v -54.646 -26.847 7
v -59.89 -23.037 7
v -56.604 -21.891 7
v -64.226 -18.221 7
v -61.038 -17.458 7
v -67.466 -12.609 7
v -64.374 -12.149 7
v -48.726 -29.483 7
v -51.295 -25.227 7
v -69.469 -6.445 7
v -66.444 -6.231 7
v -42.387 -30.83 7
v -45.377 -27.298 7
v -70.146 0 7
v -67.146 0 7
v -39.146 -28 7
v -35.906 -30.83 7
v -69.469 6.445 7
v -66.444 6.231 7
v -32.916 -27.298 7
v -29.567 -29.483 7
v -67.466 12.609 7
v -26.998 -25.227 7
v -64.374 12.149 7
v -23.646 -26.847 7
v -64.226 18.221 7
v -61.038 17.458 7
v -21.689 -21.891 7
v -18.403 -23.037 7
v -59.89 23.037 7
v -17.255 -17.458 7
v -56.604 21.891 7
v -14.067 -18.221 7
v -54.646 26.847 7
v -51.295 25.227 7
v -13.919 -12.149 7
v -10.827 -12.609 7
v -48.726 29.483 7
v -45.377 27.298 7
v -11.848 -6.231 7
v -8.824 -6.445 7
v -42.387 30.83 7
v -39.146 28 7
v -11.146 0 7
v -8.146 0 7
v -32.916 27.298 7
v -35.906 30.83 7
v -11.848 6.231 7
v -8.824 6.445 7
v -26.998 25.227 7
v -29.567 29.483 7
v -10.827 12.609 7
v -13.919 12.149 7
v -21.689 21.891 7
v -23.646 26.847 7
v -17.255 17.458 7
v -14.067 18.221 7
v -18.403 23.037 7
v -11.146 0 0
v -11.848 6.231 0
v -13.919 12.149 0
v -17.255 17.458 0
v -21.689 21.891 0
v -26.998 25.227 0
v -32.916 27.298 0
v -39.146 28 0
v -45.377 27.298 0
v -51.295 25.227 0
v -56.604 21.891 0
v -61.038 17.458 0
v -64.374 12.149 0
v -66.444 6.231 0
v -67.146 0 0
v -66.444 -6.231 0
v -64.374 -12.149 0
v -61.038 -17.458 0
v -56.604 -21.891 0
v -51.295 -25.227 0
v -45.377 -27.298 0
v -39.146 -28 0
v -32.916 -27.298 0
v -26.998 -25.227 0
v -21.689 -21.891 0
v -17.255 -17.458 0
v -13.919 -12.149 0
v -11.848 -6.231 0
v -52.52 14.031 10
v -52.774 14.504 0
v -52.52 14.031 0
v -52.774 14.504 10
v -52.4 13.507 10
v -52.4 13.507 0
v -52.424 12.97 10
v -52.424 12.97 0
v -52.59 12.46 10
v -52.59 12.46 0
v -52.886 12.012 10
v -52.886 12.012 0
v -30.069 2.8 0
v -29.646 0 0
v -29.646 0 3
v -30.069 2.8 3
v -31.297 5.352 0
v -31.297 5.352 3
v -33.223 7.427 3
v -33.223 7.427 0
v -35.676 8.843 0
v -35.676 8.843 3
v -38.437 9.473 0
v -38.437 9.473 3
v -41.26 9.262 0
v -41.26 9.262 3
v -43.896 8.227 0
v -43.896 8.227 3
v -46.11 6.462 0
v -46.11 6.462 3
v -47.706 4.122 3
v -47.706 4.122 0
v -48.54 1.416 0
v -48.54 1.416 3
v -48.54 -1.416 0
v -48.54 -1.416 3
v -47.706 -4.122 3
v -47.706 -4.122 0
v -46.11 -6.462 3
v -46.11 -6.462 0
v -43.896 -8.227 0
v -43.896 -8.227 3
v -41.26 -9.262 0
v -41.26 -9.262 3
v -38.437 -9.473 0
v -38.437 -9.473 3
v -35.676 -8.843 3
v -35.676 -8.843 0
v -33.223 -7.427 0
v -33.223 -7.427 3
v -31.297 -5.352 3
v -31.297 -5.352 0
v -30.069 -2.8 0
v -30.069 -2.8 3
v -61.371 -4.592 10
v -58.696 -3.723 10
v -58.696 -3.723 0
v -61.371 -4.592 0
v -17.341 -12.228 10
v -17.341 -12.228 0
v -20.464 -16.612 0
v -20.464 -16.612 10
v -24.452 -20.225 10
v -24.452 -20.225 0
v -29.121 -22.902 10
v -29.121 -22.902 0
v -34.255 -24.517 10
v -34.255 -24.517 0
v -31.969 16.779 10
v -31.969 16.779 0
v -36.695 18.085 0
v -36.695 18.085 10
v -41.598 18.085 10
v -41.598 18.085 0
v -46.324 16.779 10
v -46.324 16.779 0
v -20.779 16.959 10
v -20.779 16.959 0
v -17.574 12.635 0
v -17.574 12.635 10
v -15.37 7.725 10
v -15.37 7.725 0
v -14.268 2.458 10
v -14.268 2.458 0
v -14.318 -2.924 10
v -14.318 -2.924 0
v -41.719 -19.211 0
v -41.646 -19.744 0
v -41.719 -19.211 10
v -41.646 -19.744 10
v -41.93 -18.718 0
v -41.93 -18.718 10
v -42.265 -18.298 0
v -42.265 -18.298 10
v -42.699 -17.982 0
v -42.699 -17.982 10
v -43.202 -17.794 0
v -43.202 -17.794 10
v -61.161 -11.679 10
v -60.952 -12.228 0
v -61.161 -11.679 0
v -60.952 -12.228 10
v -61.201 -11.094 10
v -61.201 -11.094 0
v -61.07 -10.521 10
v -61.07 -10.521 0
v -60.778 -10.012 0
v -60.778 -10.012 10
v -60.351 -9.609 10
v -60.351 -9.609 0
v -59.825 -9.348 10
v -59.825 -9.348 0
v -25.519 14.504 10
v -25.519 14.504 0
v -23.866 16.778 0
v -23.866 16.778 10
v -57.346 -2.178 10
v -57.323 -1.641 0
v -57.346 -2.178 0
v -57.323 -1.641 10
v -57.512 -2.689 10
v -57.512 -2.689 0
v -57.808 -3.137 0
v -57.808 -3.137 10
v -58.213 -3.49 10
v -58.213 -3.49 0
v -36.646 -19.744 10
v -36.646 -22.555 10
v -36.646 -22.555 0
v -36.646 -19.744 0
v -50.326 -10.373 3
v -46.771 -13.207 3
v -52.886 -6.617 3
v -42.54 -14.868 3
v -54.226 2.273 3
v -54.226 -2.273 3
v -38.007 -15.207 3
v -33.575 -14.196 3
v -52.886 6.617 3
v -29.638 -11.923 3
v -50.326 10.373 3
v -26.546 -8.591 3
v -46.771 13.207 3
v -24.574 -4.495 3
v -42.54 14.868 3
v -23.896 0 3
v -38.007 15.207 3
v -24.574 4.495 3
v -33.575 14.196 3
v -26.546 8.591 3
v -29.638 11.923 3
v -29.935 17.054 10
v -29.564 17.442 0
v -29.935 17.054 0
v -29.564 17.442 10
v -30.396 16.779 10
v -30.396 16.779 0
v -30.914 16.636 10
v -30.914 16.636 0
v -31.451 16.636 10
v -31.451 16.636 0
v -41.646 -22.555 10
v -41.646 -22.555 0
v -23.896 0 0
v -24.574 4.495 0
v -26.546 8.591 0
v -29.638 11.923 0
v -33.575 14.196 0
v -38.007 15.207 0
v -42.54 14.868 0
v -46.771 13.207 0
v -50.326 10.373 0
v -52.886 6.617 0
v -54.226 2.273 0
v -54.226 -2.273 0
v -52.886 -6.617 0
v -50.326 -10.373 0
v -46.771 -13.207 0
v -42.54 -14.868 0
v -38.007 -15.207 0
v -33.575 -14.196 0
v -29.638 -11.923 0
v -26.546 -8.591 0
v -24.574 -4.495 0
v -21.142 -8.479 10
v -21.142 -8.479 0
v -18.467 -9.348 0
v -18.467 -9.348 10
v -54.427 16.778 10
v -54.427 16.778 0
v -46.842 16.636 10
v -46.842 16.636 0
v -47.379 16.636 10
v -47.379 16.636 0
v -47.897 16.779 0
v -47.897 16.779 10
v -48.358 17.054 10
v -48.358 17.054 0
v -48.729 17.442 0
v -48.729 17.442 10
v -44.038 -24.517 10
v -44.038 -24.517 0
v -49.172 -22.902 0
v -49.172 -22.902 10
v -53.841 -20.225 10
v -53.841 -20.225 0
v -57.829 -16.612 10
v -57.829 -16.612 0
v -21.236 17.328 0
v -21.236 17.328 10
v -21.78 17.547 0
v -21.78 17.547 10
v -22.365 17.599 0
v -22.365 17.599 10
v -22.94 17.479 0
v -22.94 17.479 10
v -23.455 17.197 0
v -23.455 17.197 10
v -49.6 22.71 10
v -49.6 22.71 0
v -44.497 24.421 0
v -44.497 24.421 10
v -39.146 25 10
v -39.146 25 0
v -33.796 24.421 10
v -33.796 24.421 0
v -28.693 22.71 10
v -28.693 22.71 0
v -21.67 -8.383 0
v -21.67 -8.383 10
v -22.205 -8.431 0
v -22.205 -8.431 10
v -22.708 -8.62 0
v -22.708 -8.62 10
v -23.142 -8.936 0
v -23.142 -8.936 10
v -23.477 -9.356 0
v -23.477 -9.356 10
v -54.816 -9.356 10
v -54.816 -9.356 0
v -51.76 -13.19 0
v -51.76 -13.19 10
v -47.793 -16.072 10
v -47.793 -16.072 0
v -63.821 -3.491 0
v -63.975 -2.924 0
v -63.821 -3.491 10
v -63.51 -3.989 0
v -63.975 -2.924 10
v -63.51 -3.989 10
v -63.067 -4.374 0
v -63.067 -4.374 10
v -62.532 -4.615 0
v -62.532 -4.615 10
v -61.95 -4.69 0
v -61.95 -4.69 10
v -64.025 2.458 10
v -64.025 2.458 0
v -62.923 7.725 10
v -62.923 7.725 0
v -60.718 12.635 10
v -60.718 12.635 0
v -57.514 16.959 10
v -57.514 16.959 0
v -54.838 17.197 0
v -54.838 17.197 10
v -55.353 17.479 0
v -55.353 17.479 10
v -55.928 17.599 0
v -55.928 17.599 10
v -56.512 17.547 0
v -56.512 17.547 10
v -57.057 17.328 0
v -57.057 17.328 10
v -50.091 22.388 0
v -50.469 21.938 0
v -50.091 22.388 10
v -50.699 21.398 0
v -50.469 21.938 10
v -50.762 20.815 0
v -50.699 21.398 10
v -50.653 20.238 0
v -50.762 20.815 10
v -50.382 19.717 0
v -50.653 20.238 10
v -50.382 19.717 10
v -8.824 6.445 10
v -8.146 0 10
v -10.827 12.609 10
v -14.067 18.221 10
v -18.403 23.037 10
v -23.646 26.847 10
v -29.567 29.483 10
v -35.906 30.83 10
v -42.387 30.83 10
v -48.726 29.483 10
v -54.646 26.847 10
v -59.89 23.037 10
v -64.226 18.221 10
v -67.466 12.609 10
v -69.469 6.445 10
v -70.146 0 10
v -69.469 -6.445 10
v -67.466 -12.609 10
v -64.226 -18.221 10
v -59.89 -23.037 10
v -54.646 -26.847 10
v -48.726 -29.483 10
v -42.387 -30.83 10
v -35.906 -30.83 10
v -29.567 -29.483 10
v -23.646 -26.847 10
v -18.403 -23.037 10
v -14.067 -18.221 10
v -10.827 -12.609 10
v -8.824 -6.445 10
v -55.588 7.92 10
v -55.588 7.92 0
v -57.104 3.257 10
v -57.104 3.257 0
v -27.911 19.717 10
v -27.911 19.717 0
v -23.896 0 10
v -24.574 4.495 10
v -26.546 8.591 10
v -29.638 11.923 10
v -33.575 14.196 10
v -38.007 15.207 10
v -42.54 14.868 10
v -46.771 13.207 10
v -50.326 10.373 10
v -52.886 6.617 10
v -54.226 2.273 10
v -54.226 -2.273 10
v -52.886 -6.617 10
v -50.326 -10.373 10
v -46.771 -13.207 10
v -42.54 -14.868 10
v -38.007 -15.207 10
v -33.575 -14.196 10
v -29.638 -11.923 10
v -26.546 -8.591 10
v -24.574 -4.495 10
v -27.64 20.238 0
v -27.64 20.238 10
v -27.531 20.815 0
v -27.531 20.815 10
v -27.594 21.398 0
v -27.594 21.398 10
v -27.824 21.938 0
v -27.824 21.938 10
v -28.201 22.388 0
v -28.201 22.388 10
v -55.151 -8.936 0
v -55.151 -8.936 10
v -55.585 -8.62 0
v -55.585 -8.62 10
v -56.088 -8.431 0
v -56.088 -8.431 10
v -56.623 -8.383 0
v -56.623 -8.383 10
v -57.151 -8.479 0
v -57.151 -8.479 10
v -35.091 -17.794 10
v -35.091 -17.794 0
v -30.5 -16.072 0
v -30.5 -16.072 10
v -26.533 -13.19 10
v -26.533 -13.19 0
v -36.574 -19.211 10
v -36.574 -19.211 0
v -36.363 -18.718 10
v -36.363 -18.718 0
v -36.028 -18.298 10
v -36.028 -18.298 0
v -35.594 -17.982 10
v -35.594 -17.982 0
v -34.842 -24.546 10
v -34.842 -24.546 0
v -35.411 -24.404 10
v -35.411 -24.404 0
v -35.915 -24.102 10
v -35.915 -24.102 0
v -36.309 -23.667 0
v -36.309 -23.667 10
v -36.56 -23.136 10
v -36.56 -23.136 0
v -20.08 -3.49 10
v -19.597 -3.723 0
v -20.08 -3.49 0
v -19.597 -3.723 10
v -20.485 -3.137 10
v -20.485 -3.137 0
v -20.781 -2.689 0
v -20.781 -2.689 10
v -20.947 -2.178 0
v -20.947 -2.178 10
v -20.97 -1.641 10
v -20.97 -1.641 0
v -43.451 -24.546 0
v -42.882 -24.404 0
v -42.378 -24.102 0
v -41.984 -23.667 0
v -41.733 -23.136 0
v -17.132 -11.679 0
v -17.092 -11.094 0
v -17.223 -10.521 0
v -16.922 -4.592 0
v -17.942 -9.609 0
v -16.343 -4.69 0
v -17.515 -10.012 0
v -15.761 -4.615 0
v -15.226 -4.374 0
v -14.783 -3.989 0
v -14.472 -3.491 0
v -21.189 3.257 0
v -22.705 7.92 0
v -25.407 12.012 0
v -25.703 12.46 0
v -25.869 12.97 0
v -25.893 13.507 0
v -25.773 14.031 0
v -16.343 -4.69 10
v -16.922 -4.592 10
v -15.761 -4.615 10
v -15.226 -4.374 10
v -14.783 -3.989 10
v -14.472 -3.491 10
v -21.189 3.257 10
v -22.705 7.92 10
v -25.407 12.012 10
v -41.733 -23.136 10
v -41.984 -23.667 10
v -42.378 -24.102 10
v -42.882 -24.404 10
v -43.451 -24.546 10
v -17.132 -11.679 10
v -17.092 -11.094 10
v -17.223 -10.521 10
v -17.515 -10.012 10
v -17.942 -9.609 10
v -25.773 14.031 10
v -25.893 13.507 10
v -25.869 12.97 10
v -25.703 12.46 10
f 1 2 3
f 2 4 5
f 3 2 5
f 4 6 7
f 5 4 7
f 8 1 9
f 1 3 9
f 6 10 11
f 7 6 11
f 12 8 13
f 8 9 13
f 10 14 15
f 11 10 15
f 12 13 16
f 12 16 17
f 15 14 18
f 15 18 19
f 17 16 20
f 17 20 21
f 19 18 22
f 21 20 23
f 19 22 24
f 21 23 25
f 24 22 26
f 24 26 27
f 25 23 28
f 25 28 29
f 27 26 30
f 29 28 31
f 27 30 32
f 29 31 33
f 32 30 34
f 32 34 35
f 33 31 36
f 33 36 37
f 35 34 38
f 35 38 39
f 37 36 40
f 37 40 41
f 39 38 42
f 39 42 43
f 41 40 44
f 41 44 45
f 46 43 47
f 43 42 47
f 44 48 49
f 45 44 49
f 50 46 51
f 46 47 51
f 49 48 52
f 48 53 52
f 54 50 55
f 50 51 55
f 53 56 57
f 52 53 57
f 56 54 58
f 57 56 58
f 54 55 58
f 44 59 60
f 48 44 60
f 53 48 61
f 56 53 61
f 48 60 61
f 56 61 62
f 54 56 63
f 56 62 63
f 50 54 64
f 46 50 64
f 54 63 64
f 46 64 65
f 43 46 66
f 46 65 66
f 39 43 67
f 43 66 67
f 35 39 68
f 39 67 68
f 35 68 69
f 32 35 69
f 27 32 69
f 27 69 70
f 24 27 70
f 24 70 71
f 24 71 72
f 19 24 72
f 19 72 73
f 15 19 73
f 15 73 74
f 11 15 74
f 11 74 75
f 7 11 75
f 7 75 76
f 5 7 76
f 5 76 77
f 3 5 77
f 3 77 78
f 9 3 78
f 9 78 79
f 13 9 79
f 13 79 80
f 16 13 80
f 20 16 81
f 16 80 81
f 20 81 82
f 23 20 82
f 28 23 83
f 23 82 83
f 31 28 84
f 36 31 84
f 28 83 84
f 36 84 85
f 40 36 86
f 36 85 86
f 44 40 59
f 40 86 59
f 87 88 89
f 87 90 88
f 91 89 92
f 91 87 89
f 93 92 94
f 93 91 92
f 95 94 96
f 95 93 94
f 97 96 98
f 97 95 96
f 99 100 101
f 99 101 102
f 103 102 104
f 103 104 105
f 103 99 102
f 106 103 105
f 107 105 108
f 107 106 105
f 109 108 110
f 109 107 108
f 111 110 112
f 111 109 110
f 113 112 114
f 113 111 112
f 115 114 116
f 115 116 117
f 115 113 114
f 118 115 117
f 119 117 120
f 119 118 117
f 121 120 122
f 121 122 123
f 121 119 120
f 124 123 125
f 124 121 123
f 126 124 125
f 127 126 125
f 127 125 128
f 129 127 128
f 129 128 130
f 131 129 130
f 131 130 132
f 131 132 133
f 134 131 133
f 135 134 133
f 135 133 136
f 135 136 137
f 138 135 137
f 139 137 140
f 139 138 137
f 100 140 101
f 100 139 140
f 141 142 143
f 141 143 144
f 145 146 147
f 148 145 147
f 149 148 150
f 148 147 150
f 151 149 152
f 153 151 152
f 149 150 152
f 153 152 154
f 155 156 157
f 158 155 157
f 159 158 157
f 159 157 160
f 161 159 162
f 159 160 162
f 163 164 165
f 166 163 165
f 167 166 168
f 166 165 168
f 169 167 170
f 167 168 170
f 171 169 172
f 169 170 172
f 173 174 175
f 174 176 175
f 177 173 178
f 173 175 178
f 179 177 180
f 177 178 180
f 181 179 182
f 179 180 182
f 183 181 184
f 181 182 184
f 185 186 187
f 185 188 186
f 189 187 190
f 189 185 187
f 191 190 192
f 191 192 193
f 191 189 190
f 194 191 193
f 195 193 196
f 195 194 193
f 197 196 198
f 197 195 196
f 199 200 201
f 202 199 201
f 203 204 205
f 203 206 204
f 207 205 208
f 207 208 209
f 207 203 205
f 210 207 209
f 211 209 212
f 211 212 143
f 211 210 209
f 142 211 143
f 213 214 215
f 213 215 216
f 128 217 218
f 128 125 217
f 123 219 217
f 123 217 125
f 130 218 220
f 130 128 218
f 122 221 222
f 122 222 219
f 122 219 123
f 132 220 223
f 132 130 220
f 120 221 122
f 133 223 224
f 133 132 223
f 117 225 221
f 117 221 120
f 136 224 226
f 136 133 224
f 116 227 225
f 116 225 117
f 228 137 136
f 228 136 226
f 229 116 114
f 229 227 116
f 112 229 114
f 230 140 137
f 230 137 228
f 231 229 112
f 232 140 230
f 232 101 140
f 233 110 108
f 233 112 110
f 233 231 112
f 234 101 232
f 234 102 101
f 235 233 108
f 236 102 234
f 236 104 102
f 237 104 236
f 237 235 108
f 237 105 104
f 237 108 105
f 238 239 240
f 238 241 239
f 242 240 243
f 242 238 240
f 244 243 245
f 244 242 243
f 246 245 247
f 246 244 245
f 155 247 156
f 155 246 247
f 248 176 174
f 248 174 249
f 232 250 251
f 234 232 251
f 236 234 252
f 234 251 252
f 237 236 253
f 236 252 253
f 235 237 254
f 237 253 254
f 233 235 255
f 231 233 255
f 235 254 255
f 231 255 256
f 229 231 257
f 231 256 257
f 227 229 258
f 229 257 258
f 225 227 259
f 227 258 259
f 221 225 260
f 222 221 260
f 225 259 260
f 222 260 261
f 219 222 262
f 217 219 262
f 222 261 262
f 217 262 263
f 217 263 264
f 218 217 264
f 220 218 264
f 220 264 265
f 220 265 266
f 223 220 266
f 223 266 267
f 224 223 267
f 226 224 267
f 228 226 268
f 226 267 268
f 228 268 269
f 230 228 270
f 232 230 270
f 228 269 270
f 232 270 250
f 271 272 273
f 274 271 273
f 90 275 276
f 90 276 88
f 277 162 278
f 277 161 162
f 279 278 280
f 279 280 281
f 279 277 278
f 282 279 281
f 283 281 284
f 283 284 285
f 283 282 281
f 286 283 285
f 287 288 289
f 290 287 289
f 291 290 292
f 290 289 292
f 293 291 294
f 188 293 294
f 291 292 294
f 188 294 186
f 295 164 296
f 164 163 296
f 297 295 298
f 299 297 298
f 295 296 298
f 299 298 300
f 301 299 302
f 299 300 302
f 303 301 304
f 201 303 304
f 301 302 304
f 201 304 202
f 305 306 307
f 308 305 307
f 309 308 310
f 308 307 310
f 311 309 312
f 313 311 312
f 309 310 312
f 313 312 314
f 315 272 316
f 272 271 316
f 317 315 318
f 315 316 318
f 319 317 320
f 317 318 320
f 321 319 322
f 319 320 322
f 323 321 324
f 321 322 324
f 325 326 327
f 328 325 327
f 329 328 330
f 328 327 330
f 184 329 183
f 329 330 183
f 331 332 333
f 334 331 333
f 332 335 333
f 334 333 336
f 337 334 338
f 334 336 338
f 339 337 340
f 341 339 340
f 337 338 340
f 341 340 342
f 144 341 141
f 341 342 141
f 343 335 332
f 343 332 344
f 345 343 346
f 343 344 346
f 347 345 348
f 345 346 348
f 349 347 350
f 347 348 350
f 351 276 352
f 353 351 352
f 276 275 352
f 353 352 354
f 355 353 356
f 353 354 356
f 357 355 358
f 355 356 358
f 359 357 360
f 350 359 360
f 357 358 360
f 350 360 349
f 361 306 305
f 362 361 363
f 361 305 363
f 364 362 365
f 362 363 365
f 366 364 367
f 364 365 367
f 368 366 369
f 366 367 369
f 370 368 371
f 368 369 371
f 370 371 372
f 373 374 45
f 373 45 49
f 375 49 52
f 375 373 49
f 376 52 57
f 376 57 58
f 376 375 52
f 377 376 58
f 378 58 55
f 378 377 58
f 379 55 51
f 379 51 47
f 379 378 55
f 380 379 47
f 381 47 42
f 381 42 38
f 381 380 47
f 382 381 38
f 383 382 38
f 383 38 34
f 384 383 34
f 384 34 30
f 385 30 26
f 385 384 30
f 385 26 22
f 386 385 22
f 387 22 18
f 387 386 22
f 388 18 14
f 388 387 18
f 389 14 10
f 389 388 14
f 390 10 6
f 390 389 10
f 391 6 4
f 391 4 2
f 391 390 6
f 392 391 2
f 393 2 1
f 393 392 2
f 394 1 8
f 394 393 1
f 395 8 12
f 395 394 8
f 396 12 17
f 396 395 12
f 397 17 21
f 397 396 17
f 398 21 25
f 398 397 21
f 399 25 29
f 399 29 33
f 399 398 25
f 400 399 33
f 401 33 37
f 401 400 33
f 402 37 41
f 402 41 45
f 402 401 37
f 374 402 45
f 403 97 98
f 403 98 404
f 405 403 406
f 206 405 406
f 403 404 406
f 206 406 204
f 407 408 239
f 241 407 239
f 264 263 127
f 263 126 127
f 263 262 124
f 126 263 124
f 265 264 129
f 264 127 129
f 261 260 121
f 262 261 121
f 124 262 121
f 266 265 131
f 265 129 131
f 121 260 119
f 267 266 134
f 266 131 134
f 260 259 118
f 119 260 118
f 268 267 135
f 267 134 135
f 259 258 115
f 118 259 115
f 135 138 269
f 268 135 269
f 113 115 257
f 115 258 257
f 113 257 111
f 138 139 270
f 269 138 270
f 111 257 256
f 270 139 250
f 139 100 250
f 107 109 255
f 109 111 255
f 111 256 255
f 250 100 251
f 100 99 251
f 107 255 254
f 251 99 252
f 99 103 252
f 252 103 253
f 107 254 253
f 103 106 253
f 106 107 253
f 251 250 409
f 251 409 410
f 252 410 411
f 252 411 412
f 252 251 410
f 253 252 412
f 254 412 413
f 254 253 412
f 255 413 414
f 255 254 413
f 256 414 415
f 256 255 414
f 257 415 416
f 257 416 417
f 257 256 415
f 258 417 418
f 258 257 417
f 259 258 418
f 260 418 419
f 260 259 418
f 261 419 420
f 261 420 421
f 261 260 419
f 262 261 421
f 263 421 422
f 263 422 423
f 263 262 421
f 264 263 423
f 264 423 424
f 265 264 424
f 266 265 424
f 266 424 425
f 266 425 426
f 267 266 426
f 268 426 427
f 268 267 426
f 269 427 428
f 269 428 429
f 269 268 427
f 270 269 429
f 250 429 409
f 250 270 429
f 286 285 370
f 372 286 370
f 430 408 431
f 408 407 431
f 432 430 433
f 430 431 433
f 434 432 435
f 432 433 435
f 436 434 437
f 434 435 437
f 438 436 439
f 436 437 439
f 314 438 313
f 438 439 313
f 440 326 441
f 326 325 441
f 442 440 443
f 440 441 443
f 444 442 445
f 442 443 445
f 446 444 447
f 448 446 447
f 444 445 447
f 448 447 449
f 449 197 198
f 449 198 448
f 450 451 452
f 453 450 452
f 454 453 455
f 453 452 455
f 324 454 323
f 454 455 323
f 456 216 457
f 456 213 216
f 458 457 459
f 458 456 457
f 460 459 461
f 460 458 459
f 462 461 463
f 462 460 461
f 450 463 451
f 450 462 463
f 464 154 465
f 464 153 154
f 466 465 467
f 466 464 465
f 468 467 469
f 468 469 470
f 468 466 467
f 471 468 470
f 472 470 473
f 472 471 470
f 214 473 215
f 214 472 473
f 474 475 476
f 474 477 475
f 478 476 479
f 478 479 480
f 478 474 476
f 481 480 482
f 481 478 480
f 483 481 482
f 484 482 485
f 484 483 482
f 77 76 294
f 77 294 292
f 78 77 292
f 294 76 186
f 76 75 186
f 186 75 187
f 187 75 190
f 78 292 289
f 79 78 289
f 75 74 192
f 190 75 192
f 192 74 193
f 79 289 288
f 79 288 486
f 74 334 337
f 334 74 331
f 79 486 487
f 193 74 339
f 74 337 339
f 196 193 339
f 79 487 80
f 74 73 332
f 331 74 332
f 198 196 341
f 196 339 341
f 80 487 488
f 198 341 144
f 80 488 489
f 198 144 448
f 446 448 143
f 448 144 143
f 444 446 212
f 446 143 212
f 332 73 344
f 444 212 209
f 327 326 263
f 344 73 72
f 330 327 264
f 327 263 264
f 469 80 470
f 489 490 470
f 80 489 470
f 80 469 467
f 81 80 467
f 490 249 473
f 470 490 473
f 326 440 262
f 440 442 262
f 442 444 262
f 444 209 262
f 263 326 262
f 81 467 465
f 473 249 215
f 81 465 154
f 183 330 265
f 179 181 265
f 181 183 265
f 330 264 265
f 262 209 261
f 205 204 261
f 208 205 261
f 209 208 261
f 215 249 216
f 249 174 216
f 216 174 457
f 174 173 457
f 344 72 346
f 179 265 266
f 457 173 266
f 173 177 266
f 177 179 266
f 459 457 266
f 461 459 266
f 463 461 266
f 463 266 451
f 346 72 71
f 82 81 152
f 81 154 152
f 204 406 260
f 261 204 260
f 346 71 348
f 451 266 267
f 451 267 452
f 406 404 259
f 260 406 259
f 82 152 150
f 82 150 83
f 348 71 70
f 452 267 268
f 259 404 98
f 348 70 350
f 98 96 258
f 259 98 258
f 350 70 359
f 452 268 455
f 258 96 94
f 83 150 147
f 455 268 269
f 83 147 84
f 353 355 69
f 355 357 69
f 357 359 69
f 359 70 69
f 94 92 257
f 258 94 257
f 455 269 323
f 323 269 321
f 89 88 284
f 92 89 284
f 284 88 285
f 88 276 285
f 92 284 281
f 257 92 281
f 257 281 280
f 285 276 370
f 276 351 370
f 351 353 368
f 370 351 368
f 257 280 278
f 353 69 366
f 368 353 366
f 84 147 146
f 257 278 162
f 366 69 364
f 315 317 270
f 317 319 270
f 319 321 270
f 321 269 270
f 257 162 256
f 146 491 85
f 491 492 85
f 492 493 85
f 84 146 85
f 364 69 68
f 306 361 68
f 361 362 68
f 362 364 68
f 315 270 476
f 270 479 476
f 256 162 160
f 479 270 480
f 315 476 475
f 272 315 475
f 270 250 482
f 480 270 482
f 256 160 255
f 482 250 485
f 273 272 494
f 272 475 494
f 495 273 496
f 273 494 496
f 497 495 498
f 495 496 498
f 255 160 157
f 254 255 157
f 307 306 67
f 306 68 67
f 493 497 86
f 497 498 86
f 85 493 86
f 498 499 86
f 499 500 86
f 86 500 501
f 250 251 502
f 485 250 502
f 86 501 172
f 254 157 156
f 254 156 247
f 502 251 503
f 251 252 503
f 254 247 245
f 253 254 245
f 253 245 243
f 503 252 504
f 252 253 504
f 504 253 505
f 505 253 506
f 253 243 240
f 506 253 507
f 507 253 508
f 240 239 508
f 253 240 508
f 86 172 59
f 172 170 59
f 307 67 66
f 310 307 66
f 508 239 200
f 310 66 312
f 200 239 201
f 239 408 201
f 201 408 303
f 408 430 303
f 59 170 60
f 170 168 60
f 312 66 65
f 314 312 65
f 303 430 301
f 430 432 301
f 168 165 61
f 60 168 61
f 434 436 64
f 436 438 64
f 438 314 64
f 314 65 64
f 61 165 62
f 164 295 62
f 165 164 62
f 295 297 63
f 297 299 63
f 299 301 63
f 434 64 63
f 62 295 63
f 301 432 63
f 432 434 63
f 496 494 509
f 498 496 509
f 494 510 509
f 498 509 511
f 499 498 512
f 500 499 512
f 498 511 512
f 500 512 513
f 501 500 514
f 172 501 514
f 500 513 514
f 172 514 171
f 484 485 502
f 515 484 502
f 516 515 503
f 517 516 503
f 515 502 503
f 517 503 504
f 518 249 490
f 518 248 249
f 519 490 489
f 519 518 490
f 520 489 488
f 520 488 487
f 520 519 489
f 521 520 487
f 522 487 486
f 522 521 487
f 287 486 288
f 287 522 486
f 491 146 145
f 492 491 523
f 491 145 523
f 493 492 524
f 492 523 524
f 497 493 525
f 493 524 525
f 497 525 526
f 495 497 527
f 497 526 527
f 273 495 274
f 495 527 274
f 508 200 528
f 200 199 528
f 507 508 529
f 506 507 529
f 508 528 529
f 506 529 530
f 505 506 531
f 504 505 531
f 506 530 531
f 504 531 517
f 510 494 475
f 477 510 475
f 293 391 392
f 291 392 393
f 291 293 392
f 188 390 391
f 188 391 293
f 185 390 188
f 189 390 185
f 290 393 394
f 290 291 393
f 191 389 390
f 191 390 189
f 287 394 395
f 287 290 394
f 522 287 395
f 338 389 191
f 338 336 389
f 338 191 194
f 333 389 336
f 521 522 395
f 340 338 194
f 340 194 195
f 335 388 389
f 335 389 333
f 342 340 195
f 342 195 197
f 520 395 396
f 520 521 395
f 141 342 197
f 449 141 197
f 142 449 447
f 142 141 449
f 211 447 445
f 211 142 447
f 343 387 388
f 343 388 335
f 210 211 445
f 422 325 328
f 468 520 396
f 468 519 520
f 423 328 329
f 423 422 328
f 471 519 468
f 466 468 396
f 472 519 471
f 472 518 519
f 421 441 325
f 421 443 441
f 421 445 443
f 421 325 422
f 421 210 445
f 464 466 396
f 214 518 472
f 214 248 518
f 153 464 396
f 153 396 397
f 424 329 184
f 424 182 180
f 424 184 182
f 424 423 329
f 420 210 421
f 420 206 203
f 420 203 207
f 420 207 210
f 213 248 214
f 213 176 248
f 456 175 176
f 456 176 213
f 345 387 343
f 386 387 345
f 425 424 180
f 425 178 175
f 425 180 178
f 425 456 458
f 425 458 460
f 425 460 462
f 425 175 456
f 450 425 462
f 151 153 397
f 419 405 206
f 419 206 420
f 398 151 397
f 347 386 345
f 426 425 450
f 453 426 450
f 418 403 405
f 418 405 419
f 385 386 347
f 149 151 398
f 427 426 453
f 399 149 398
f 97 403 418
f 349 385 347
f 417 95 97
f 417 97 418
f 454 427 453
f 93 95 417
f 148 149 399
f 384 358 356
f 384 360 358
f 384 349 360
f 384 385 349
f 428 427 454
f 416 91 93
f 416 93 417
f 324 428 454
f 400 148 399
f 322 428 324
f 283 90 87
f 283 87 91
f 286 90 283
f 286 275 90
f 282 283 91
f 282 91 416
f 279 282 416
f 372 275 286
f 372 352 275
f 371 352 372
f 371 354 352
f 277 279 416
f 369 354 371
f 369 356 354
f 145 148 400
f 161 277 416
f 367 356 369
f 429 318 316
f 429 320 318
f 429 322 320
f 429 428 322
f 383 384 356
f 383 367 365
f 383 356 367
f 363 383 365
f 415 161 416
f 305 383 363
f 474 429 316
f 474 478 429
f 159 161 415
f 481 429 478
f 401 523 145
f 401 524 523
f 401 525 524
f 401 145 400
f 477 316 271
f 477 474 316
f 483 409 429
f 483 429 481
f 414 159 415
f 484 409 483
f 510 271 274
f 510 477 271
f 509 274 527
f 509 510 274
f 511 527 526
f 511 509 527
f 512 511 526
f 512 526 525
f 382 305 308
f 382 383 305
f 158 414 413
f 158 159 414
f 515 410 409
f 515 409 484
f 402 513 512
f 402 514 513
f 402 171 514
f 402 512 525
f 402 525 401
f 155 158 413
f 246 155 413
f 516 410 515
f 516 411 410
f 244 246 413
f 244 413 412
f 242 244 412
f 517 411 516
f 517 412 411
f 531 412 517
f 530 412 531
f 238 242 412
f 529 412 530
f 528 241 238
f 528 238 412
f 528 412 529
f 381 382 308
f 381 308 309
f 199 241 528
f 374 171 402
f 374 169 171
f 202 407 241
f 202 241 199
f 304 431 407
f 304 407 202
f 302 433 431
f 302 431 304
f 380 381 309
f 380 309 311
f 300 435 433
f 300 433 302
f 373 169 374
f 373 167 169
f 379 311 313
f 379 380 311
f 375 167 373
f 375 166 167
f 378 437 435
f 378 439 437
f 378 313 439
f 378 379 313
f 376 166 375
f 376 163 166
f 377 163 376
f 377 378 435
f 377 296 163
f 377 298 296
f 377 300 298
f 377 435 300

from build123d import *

# Parameters (mm, degrees)
F0_R     = 15.25
F0_R_2   = 9.5
F1_DEPTH = 3
F0_R_3   = 28
F2_DEPTH = 10
F3_R     = 31
F3_R_2   = 28
F4_DEPTH = 3
F5_R     = 2


# Not quite as in the source:
# - a feature names something its author has since deleted; it is built from what else it names


with BuildPart() as f1:
    # F0 (on Top) → F1 (new body)
    with BuildSketch(Plane.XY):
        with Locations((-39.1464792192, 0)):
            Circle(F0_R)
        with Locations((-39.1464792192, 0)):
            Circle(F0_R_2, mode=Mode.SUBTRACT)
    extrude(amount=F1_DEPTH)


with BuildPart() as f2:
    # F0 (on Top) → F2 (new body)
    with BuildSketch(Plane.XY):
        with Locations((-39.1464792192, 0)):
            Circle(F0_R_3)
        with BuildLine():
            ThreePointArc((-41.6464792192, -24.8746859277), (-53.8411105265, -20.2254248594), (-62.0311688756, -10.0643419721))
            Line((-62.0311688756, -10.0643419721), (-55.5670947689, -7.9640369769))
            ThreePointArc((-55.5670947689, -7.9640369769), (-49.8735600735, -14.7645601473), (-41.6464792192, -18.0779561898))
            Line((-41.6464792192, -18.0779561898), (-41.6464792192, -24.8746859277))
        make_face(mode=Mode.SUBTRACT)
        with BuildLine():
            Line((-36.6464792192, -24.8746859277), (-36.6464792192, -18.0779561898))
            ThreePointArc((-36.6464792192, -18.0779561898), (-28.4193983649, -14.7645601473), (-22.7258636695, -7.9640369769))
            Line((-22.7258636695, -7.9640369769), (-16.2617895628, -10.0643419721))
            ThreePointArc((-16.2617895628, -10.0643419721), (-24.4518479119, -20.2254248594), (-36.6464792192, -24.8746859277))
        make_face(mode=Mode.SUBTRACT)
        with BuildLine():
            ThreePointArc((-51.7949777451, 13.1559106504), (-56.5032606416, 5.6395601473), (-57.1121797407, -3.2087543955))
            Line((-57.1121797407, -3.2087543955), (-63.5762538474, -5.3090593907))
            ThreePointArc((-63.5762538474, -5.3090593907), (-62.9228921266, 7.7254248594), (-55.7899952488, 18.6545805145))
            Line((-55.7899952488, 18.6545805145), (-51.7949777451, 13.1559106504))
        make_face(mode=Mode.SUBTRACT)
        with BuildLine():
            ThreePointArc((-30.5430656652, 16.0948369118), (-39.1464792192, 18.25), (-47.7498927732, 16.0948369118))
            Line((-47.7498927732, 16.0948369118), (-51.7449102769, 21.593506776))
            ThreePointArc((-51.7449102769, 21.593506776), (-39.1464792192, 25), (-26.5480481614, 21.593506776))
            Line((-26.5480481614, 21.593506776), (-30.5430656652, 16.0948369118))
        make_face(mode=Mode.SUBTRACT)
        with Locations((-39.1464792192, 0)):
            Circle(F0_R, mode=Mode.SUBTRACT)
        with BuildLine():
            ThreePointArc((-21.1807786977, -3.2087543955), (-21.7896977968, 5.6395601473), (-26.4979806933, 13.1559106504))
            Line((-26.4979806933, 13.1559106504), (-22.5029631896, 18.6545805145))
            ThreePointArc((-22.5029631896, 18.6545805145), (-15.3700663118, 7.7254248594), (-14.716704591, -5.3090593907))
            Line((-14.716704591, -5.3090593907), (-21.1807786977, -3.2087543955))
        make_face(mode=Mode.SUBTRACT)
    extrude(amount=F2_DEPTH)

    # F3 (on face) → F4 (join)
    with BuildSketch(Plane.XY.offset(10)):
        with Locations((-39.1464792192, 0)):
            Circle(F3_R)
        with Locations((-39.1464792192, 0)):
            Circle(F3_R_2, mode=Mode.SUBTRACT)
    extrude(amount=-F4_DEPTH)

    # F5
    f5_edges = [f2.edges().sort_by_distance(p)[0] for p in [
        (-62.031169, -10.064342, 5),
        (-55.567095, -7.964037, 5),
        (-41.646479, -24.874686, 5),
        (-41.646479, -18.077956, 5),
        (-36.646479, -18.077956, 5),
        (-36.646479, -24.874686, 5),
        (-16.26179, -10.064342, 5),
        (-22.725864, -7.964037, 5),
        (-14.716705, -5.309059, 5),
        (-21.180779, -3.208754, 5),
        (-26.497981, 13.155911, 5),
        (-22.502963, 18.654581, 5),
        (-26.548048, 21.593507, 5),
        (-30.543066, 16.094837, 5),
        (-47.749893, 16.094837, 5),
        (-51.74491, 21.593507, 5),
        (-51.794978, 13.155911, 5),
        (-57.11218, -3.208754, 5),
        (-63.576254, -5.309059, 5),
        (-55.789995, 18.654581, 5),
    ]]
    fillet(f5_edges, radius=F5_R)


solid = Compound([f1.part, f2.part])
